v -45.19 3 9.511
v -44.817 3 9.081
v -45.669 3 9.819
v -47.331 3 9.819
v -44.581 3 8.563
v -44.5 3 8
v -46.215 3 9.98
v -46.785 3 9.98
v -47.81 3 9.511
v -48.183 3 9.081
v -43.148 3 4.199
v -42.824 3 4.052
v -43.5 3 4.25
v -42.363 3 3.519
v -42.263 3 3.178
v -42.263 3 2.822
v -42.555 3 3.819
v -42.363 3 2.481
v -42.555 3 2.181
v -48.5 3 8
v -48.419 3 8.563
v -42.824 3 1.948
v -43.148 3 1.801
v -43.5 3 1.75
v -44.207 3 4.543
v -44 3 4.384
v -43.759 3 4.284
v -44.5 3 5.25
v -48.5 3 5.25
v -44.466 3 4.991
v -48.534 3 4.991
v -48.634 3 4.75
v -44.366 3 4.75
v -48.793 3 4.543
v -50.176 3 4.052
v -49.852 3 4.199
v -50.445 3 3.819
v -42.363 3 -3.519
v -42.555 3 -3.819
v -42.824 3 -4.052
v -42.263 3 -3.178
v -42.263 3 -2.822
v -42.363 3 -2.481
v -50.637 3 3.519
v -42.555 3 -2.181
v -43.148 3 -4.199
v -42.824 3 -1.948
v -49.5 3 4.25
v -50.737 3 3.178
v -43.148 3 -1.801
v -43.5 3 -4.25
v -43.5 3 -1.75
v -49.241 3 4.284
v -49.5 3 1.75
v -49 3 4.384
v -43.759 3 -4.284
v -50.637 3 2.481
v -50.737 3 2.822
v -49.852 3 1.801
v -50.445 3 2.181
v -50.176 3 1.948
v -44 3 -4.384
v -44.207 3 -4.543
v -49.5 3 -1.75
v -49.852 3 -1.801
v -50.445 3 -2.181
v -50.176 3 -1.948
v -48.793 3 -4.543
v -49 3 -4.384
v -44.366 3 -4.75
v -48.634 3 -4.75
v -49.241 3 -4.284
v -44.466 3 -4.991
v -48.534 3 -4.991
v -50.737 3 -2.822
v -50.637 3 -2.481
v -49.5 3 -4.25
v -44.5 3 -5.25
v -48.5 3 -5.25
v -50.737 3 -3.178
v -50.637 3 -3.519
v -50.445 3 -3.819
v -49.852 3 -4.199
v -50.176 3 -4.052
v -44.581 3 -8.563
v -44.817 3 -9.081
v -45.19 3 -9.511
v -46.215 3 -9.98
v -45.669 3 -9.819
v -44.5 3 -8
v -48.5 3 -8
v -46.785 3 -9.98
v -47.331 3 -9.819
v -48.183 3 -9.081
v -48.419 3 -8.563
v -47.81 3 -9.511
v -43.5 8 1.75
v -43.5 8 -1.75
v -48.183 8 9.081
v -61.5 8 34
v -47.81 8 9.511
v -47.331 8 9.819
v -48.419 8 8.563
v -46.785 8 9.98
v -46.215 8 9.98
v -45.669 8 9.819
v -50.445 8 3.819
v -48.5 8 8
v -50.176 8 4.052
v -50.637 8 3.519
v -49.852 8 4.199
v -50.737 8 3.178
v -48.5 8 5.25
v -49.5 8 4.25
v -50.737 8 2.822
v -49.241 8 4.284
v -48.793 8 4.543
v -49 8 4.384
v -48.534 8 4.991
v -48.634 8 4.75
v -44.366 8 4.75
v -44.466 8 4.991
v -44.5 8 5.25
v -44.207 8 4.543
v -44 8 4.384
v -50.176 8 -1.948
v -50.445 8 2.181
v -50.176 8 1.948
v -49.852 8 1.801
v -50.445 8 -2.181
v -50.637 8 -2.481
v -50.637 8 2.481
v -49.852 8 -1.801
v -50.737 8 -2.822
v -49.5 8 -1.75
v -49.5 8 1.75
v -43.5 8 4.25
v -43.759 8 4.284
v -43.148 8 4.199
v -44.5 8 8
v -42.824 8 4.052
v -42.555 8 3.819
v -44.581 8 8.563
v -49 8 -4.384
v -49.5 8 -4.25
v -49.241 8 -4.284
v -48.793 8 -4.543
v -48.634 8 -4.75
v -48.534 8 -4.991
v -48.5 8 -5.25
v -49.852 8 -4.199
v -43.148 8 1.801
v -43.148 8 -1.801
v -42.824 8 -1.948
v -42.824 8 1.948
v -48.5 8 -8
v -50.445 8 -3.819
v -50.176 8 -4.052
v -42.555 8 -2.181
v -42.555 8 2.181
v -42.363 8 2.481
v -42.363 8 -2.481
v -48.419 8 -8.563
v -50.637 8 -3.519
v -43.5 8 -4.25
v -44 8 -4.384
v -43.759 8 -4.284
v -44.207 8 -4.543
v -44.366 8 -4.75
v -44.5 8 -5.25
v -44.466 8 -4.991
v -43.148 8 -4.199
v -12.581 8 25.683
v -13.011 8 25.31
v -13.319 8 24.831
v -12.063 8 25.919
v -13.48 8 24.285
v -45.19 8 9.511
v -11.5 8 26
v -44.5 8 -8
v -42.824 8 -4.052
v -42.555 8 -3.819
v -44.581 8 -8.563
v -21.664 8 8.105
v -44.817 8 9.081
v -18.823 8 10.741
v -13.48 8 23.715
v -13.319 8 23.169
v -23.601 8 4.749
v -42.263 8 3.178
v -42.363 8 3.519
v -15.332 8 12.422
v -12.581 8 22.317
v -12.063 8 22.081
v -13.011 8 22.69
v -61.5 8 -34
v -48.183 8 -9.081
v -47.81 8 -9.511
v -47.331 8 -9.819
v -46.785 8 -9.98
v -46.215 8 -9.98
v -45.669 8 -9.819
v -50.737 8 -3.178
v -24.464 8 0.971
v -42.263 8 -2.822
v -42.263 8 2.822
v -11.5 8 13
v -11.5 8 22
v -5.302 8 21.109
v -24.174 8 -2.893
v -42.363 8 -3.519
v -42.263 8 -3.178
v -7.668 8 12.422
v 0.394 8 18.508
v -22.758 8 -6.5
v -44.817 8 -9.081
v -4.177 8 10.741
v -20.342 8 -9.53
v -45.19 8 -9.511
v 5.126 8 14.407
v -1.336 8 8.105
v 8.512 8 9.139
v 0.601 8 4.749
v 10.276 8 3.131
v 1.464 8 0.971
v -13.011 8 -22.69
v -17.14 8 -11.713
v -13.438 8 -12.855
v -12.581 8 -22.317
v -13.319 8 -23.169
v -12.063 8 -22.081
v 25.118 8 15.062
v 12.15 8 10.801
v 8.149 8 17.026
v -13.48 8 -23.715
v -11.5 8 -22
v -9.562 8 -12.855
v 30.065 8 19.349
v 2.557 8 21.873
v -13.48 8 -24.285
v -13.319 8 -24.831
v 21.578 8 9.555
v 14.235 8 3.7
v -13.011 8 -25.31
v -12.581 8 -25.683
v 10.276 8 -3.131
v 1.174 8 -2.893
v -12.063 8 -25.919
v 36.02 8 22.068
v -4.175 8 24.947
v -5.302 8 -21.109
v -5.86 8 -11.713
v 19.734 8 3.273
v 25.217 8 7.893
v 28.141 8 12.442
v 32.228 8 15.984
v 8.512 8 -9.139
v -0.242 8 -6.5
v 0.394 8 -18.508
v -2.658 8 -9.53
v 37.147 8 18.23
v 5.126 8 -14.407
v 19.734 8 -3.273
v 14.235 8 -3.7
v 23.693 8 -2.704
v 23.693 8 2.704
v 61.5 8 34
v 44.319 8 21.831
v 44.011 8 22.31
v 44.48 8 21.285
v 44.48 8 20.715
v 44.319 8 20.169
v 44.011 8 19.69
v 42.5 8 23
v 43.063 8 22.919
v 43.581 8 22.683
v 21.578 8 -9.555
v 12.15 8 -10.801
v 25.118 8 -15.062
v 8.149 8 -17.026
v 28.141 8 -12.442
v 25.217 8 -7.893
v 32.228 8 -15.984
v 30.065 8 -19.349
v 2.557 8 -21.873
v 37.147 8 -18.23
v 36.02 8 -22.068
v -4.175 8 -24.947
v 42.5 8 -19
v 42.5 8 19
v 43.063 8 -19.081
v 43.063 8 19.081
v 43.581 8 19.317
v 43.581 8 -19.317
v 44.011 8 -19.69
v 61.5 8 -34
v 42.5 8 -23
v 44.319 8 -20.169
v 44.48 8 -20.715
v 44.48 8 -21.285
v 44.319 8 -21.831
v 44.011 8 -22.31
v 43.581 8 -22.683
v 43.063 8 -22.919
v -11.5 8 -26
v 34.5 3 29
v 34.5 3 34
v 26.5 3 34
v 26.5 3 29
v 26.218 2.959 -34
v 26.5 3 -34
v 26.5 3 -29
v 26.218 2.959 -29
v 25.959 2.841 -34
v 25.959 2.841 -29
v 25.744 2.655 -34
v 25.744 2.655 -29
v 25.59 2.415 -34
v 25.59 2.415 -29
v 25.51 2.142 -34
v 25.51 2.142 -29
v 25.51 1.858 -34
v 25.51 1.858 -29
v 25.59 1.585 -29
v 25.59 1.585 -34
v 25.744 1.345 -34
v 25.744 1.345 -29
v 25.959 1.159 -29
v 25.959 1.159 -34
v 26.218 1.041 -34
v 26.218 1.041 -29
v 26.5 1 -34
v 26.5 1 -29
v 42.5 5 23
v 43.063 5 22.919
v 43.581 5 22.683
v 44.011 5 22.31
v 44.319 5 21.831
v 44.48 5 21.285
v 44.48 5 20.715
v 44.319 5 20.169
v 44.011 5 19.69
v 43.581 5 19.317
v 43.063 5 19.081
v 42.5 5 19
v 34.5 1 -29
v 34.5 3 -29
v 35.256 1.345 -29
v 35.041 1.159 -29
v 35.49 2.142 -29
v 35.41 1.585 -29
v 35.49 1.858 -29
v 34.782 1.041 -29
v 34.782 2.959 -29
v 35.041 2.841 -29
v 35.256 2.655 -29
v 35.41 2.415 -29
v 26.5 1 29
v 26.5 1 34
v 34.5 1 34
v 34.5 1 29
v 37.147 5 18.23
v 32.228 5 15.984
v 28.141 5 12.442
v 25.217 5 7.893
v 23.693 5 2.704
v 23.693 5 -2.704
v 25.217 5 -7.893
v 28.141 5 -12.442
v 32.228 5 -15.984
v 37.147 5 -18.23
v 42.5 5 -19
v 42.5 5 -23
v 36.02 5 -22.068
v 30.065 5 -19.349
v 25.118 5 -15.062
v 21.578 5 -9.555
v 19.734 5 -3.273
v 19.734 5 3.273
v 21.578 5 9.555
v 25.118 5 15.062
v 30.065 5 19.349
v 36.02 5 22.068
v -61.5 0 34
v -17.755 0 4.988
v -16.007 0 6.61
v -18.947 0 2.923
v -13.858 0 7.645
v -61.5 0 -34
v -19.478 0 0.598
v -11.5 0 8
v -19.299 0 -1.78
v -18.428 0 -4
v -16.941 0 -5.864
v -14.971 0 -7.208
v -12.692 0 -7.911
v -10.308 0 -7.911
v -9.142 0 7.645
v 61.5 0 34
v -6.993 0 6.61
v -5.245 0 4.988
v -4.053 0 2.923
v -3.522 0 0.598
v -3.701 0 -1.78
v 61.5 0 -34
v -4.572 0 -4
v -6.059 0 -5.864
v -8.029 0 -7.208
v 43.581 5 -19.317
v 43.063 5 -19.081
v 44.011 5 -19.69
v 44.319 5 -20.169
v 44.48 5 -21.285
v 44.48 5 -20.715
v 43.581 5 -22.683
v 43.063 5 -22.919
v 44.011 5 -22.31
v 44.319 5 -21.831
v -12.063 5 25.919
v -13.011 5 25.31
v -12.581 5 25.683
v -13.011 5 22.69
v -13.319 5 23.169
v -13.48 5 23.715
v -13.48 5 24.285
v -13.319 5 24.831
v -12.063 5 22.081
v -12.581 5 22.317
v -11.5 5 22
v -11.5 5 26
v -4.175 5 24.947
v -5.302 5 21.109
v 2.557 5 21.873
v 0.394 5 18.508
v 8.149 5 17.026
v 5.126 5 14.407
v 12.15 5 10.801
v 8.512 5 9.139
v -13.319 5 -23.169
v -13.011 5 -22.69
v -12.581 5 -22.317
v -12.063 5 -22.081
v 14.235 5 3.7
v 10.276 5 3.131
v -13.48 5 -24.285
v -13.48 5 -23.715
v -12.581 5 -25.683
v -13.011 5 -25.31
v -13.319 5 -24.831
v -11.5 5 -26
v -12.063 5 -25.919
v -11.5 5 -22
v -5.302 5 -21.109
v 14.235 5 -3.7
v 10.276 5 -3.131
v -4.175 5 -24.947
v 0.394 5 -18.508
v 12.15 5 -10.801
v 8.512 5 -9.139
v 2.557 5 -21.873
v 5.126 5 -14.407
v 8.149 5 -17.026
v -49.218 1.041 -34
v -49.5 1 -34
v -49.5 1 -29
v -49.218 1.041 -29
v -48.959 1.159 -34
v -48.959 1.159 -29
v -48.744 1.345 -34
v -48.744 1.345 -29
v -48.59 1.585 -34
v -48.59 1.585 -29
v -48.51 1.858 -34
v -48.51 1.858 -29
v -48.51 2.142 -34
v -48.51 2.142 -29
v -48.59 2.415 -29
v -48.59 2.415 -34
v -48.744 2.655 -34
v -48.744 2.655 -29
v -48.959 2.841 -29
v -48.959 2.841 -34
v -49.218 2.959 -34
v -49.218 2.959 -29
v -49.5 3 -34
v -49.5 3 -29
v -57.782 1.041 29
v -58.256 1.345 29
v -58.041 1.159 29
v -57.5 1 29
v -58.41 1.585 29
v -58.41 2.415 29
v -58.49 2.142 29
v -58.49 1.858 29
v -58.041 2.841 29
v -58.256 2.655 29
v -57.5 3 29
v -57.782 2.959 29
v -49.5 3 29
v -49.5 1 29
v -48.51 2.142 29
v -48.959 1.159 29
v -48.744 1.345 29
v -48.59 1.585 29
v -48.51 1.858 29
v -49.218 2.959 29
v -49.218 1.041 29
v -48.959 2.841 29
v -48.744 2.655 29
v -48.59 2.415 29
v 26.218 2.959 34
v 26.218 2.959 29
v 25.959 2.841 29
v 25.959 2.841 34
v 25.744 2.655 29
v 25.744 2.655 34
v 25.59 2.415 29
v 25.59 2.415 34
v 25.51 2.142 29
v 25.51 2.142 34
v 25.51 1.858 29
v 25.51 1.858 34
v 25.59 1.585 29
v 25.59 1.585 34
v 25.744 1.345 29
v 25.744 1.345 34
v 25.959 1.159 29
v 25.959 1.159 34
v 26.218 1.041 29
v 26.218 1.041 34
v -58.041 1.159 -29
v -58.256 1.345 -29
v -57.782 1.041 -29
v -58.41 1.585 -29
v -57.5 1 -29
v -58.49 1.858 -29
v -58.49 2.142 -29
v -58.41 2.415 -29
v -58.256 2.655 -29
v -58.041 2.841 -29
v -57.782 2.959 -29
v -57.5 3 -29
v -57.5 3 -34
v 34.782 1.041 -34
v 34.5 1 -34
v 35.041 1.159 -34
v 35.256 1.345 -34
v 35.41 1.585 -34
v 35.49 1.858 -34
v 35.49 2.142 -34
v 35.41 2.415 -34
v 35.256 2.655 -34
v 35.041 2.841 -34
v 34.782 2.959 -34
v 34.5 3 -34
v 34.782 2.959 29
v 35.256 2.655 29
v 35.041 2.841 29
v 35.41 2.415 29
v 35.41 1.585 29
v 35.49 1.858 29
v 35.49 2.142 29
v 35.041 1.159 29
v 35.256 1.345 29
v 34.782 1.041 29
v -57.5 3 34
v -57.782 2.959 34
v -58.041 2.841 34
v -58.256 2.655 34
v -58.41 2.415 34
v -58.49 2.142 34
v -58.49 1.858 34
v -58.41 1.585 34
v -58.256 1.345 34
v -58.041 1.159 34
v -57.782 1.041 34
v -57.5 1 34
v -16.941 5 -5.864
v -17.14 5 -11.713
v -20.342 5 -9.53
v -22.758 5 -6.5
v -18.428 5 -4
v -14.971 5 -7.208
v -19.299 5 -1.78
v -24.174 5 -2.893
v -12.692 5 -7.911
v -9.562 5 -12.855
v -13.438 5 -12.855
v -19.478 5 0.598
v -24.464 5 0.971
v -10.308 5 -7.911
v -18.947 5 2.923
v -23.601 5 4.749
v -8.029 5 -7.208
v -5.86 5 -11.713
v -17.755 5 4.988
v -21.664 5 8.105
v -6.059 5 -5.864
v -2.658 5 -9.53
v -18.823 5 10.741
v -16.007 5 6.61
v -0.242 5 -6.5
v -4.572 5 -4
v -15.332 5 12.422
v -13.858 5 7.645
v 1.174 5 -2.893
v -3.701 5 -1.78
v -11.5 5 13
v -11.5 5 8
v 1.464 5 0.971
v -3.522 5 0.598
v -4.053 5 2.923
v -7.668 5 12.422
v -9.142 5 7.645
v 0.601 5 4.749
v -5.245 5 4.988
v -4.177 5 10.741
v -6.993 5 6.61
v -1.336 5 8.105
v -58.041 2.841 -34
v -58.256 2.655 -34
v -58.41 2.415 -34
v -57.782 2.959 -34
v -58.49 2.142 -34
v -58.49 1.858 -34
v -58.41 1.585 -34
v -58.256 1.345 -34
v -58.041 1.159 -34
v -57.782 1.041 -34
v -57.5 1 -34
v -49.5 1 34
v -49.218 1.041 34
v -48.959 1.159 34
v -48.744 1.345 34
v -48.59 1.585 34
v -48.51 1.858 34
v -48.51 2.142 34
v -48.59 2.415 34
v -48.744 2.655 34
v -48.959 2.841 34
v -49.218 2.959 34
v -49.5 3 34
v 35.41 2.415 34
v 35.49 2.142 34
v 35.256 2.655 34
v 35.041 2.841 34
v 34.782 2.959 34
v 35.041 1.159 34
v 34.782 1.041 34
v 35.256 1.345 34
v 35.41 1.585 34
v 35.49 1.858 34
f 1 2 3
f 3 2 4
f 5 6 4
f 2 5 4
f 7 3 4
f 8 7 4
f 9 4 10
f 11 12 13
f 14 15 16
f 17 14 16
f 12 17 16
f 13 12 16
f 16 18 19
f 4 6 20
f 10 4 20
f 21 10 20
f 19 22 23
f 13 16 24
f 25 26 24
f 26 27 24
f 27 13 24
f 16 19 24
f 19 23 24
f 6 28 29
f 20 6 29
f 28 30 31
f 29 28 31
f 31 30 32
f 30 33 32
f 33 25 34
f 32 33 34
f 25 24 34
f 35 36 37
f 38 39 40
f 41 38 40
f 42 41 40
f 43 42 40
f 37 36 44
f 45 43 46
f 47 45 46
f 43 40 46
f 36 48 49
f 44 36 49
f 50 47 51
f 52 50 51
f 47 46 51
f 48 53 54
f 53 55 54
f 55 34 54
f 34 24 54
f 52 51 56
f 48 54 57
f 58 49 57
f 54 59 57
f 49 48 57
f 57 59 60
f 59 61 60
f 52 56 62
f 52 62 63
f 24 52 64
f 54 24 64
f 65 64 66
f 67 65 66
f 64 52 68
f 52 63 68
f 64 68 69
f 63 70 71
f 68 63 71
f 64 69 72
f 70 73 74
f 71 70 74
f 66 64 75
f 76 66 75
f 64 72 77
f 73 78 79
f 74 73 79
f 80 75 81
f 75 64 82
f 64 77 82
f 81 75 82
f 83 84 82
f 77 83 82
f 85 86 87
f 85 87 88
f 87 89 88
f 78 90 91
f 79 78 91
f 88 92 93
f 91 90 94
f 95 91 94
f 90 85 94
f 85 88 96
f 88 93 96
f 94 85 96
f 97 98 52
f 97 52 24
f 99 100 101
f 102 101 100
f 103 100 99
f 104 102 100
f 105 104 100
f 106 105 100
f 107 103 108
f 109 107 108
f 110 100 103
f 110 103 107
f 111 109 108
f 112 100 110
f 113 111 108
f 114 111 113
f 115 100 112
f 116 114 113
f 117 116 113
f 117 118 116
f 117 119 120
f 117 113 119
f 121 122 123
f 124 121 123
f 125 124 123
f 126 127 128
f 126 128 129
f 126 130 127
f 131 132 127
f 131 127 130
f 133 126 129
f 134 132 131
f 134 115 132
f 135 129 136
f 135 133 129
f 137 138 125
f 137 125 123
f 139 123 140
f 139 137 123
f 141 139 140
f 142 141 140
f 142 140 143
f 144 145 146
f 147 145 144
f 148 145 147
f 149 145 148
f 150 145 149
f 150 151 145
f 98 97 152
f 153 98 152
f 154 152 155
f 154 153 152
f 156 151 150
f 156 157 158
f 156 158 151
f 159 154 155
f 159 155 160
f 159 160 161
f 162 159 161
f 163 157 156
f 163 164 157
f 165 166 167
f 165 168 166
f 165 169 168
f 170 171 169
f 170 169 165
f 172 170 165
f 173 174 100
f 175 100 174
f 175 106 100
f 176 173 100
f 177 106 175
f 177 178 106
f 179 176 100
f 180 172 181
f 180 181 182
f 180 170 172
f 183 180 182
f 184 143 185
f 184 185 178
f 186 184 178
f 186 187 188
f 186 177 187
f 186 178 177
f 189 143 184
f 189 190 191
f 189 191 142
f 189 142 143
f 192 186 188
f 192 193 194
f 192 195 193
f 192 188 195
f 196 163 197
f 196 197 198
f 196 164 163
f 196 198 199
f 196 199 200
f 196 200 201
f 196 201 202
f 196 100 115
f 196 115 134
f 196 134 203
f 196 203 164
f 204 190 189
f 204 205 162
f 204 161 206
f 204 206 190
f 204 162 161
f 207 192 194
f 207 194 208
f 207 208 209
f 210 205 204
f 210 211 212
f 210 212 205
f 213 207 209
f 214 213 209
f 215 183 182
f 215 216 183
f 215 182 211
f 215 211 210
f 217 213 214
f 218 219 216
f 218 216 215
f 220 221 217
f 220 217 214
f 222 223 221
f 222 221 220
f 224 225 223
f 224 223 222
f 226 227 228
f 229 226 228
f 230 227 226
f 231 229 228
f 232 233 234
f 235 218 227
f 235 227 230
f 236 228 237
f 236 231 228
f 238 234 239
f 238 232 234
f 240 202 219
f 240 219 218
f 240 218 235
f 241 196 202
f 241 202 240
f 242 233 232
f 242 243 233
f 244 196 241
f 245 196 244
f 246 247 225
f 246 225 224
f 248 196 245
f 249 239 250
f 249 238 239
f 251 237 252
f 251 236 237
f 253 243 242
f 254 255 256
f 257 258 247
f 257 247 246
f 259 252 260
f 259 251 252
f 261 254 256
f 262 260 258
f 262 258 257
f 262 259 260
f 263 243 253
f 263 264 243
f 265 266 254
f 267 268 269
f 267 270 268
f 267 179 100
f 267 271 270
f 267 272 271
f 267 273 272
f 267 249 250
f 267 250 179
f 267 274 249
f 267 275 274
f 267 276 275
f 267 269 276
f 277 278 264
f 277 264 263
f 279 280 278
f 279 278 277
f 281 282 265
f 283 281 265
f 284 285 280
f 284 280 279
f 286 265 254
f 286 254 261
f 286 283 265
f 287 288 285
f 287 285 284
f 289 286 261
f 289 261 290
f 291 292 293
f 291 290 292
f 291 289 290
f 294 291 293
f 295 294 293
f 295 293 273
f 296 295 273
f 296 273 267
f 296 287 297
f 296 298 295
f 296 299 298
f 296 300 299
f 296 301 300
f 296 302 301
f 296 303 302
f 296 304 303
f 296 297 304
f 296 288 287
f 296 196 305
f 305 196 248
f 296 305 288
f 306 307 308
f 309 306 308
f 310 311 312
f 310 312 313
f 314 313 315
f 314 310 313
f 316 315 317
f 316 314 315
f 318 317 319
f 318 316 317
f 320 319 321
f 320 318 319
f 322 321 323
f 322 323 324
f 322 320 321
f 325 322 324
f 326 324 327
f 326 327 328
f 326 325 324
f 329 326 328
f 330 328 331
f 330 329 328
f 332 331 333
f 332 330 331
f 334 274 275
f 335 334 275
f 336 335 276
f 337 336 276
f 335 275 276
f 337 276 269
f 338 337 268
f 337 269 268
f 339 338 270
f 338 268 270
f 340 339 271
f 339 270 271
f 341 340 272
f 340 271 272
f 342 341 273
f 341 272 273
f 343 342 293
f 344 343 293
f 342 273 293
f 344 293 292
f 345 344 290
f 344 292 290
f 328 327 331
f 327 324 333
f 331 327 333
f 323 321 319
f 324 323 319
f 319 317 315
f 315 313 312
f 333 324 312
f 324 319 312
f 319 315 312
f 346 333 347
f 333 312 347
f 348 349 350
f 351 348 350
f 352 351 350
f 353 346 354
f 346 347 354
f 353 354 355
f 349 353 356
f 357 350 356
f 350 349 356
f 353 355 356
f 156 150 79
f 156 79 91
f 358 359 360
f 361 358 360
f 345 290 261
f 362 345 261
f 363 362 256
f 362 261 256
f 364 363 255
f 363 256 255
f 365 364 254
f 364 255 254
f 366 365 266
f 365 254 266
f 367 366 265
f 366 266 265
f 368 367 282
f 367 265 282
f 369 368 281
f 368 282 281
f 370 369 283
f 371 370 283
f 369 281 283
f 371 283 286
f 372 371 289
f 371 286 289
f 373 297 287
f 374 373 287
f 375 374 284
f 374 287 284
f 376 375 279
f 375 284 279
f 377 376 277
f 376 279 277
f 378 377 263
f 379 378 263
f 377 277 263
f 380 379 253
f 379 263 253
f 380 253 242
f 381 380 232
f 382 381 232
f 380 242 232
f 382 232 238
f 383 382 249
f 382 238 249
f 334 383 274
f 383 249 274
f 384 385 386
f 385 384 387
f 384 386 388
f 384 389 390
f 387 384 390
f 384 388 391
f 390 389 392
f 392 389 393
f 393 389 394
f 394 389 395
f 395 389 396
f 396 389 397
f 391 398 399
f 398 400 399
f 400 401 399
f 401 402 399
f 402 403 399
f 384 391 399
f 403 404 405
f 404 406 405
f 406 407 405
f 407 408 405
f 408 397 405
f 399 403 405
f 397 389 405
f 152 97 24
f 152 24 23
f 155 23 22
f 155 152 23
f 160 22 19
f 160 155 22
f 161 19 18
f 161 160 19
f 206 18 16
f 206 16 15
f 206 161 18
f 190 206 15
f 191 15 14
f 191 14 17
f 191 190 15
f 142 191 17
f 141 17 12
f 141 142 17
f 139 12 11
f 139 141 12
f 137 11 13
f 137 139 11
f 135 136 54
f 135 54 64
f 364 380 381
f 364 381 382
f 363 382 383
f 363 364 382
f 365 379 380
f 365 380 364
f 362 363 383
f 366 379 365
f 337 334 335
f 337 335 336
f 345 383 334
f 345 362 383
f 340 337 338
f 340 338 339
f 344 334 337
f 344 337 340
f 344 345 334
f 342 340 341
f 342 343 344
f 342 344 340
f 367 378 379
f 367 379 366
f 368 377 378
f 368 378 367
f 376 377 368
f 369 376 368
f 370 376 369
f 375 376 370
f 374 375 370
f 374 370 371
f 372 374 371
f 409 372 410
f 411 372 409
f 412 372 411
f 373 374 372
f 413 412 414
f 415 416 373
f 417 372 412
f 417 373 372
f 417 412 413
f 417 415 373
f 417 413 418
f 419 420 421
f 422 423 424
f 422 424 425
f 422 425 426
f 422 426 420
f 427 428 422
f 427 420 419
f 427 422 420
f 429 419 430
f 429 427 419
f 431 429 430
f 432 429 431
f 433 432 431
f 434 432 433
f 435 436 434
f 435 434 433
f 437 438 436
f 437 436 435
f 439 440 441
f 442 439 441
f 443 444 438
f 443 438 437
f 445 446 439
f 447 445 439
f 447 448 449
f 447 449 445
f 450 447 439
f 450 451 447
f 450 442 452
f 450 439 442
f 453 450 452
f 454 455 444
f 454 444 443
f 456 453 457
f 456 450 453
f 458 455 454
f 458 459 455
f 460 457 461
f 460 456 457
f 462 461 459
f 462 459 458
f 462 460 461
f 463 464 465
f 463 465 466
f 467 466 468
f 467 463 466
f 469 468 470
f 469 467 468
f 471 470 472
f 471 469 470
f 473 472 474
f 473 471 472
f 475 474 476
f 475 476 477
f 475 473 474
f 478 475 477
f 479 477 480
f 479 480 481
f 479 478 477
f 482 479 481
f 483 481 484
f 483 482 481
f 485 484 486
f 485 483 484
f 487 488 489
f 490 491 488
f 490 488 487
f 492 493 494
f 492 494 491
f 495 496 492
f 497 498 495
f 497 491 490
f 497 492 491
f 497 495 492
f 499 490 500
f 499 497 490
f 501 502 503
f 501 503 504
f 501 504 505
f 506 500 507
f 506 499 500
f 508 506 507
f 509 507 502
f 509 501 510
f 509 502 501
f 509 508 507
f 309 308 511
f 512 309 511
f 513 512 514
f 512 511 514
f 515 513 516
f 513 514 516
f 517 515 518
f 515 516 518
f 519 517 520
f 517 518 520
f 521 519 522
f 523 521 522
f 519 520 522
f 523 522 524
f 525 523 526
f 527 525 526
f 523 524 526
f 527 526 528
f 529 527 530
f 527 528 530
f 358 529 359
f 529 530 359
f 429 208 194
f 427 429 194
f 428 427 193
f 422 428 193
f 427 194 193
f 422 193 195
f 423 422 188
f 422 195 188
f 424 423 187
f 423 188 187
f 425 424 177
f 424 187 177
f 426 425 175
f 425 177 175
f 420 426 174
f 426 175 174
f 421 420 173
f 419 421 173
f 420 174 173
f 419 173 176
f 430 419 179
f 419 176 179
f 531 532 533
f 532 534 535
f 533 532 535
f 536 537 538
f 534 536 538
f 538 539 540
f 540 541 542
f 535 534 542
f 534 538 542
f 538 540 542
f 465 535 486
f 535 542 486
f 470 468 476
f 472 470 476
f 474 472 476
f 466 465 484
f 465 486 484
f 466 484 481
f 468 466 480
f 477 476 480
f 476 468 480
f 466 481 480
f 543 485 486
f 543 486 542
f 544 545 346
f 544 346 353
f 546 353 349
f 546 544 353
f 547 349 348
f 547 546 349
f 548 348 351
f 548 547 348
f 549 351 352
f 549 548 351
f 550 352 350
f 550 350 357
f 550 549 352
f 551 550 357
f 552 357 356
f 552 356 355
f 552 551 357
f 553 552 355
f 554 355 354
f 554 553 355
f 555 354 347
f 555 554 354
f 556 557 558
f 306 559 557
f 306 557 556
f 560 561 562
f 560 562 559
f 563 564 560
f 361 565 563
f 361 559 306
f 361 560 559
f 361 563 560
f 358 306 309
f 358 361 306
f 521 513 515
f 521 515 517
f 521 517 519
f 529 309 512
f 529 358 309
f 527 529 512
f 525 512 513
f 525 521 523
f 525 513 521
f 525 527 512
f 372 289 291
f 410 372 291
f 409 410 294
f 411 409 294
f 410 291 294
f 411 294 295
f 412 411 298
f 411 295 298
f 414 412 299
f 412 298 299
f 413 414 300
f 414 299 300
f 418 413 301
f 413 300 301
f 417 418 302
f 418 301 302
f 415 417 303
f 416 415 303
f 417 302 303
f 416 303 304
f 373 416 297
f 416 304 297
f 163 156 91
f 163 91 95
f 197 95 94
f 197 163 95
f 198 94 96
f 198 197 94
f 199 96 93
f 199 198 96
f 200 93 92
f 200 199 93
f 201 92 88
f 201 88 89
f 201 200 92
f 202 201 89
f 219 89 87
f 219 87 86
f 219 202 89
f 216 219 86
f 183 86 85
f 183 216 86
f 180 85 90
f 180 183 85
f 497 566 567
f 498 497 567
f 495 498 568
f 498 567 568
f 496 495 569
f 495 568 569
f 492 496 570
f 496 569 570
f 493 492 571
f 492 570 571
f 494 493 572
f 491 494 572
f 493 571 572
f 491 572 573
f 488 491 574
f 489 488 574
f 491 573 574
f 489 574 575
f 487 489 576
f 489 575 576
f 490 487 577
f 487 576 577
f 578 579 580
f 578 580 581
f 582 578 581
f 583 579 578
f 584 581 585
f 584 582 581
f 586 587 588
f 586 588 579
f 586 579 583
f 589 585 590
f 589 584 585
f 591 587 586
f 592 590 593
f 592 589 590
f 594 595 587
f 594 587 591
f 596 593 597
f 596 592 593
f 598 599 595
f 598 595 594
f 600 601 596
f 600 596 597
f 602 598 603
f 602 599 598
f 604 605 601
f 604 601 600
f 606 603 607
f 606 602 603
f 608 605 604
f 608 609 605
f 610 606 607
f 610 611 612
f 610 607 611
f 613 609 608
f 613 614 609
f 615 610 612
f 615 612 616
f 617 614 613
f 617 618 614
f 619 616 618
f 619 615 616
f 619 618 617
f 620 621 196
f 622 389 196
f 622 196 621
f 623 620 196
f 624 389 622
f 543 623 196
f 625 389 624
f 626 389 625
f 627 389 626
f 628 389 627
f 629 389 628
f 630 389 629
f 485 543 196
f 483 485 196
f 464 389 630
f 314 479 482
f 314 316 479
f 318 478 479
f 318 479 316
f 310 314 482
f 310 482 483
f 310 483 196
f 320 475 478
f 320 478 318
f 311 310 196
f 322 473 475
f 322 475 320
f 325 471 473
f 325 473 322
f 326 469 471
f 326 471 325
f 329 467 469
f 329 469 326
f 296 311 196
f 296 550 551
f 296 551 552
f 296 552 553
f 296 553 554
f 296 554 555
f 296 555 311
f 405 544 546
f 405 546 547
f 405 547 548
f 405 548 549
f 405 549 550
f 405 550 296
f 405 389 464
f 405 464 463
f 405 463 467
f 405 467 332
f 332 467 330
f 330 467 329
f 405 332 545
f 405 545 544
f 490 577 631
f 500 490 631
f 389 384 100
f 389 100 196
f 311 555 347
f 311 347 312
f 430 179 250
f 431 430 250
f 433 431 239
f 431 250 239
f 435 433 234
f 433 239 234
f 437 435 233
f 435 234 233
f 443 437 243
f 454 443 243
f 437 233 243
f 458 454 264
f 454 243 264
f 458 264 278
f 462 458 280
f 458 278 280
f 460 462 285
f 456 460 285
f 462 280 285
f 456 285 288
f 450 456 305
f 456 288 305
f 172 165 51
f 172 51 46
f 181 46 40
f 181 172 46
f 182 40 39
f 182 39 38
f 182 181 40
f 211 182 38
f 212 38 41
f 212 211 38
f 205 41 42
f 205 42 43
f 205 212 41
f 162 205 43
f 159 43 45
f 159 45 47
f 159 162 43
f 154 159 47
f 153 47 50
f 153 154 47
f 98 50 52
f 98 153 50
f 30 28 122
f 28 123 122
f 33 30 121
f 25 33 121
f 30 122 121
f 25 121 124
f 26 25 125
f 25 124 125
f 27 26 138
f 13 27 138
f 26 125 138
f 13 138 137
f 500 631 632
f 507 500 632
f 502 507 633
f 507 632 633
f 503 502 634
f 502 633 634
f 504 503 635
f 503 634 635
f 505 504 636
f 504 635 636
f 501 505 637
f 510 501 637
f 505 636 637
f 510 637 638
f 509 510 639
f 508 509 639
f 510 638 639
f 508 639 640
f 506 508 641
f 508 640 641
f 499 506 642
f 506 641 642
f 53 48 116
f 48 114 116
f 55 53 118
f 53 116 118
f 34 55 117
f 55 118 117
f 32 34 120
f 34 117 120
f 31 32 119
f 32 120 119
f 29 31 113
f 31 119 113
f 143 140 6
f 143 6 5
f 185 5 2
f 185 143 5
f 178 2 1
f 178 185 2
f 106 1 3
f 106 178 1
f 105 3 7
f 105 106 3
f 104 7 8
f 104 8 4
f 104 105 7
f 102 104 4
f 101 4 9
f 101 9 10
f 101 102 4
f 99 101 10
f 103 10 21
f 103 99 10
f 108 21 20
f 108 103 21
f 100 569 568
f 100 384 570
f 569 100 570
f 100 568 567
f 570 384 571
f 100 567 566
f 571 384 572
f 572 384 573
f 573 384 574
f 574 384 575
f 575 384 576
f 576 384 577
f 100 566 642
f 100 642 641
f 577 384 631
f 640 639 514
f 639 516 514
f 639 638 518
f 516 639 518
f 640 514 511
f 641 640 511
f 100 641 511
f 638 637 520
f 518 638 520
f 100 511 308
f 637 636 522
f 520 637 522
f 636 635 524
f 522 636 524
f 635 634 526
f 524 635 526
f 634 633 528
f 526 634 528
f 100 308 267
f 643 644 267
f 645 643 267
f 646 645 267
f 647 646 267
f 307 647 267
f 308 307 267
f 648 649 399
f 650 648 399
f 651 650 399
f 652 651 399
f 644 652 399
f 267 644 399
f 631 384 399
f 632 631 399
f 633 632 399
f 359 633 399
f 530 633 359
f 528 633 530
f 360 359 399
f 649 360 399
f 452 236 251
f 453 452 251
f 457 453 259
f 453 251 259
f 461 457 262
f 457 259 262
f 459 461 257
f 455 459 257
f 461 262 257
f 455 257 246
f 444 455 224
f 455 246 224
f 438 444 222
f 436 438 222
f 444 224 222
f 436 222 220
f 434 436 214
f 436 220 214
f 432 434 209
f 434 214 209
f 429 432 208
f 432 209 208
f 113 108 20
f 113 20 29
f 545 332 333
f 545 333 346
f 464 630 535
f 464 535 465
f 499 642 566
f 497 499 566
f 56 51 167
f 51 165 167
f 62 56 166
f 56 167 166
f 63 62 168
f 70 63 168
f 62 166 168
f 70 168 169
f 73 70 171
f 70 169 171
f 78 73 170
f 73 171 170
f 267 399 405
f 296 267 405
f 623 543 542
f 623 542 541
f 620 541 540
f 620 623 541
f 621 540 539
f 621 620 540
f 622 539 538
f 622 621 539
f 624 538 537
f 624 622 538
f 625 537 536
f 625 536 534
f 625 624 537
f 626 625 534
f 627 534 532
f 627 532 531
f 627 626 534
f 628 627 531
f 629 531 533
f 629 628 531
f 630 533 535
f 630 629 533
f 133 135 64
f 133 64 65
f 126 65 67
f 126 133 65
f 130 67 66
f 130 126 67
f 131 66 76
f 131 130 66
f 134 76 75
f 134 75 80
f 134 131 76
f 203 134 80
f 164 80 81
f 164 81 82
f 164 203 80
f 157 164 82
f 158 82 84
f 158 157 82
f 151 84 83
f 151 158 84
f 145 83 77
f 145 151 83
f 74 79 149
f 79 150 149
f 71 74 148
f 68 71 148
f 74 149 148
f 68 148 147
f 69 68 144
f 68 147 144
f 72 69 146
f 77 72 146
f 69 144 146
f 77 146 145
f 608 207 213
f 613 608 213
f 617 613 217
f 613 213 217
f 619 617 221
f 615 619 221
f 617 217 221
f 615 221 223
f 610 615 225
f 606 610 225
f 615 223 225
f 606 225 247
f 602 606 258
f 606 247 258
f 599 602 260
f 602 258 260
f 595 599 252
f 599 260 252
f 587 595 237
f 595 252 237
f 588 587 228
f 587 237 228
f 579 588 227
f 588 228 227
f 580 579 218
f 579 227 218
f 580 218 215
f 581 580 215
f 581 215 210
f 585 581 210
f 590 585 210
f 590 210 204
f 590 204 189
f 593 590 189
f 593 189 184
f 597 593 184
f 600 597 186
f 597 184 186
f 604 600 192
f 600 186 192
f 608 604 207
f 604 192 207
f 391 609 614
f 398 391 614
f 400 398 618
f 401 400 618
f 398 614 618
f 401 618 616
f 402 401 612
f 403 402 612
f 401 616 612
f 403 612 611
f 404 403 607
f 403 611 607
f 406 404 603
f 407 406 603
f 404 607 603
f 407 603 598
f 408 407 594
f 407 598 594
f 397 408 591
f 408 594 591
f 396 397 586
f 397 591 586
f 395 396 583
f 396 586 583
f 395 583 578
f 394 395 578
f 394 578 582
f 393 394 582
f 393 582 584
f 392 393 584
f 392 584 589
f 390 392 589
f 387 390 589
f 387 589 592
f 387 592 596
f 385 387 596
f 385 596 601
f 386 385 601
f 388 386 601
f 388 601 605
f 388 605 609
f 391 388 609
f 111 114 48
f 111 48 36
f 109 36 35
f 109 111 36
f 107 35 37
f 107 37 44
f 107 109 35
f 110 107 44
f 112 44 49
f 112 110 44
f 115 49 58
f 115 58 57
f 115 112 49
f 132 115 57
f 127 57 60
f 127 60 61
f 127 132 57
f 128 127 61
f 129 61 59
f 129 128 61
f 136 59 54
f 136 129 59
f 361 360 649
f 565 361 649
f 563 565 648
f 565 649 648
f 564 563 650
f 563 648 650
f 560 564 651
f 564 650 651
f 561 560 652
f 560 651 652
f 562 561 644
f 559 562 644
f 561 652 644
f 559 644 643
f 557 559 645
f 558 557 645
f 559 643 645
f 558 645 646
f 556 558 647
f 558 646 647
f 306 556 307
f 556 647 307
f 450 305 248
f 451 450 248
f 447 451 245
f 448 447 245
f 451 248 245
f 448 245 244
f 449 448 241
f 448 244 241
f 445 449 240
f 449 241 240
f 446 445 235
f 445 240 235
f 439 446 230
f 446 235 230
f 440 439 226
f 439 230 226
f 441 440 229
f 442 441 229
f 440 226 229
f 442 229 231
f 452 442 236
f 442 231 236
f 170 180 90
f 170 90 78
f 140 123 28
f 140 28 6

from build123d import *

# Parameters (mm, degrees)
SKETCH1_W              = 123
SKETCH1_H              = 68
BOSS_EXTRUDE1_DEPTH    = 8
CUT_EXTRUDE1_DEPTH     = 5
LPATTERN6_COUNT        = 2
LPATTERN6_PITCH        = 84
LPATTERN6_COPY_1_DEPTH = 5
SKETCH7_R              = 8
CUT_EXTRUDE2_DEPTH     = 10
SKETCH8_R              = 13
CUT_EXTRUDE3_DEPTH     = 3
CUT_EXTRUDE4_DEPTH     = 5
CUT_EXTRUDE5_DEPTH     = 3
CUT_EXTRUDE6_DEPTH     = 3
CUT_EXTRUDE7_DEPTH     = 5
FILLET2_R              = 1


with BuildPart() as part:
    # Sketch1 → Boss-Extrude1 (new body)
    with BuildSketch(Plane(origin=(0, 0, 0), x_dir=(1, 0, 0), z_dir=(0, 1, 0))):
        Rectangle(SKETCH1_W, SKETCH1_H)
    extrude(amount=BOSS_EXTRUDE1_DEPTH)

    # Sketch6 → Cut-Extrude1 (cut)
    with BuildSketch(Plane(origin=(0, 0, -34), x_dir=(-1, 0, 0), z_dir=(0, 0, -1))):
        with BuildLine():
            Line((49.5, 3), (57.5, 3))
            ThreePointArc((57.5, 3), (58.5, 2), (57.5, 1))
            Line((57.5, 1), (49.5, 1))
            ThreePointArc((49.5, 1), (48.5, 2), (49.5, 3))
        make_face()
    cut_extrude1 = extrude(amount=-CUT_EXTRUDE1_DEPTH, mode=Mode.SUBTRACT)

    # Mirror16: Cut-Extrude1 across plane
    add(cut_extrude1.mirror(Plane.XY), mode=Mode.SUBTRACT)

    # LPattern6: Cut-Extrude1 ×2
    with Locations(*[(i * LPATTERN6_PITCH, 0, 0) for i in range(1, LPATTERN6_COUNT)]):
        add(cut_extrude1, mode=Mode.SUBTRACT)

    # LPattern6 copy 1 sketch → LPattern6 copy 1 (cut)
    with BuildSketch(Plane(origin=(84, 0, 34), x_dir=(-1, 0, 0), z_dir=(0, 0, 1))):
        with BuildLine():
            Line((49.5, -3), (57.5, -3))
            ThreePointArc((57.5, -3), (58.5, -2), (57.5, -1))
            Line((57.5, -1), (49.5, -1))
            ThreePointArc((49.5, -1), (48.5, -2), (49.5, -3))
        make_face()
    extrude(amount=-LPATTERN6_COPY_1_DEPTH, mode=Mode.SUBTRACT)

    # Sketch7 → Cut-Extrude2 (cut)
    with BuildSketch(Plane(origin=(0, 8, 0), x_dir=(1, 0, 0), z_dir=(0, 1, 0))):
        with Locations(Location((-11.5, 0, 0), (0, 0, 270))):
            Circle(SKETCH7_R)
    extrude(amount=-CUT_EXTRUDE2_DEPTH, mode=Mode.SUBTRACT)

    # Sketch8 → Cut-Extrude3 (cut)
    with BuildSketch(Plane(origin=(0, 8, 0), x_dir=(1, 0, 0), z_dir=(0, 1, 0))):
        with Locations(Location((-11.5, 0, 0), (0, 0, 270))):
            Circle(SKETCH8_R)
    extrude(amount=-CUT_EXTRUDE3_DEPTH, mode=Mode.SUBTRACT)

    # Sketch9 → Cut-Extrude4 (cut)
    with BuildSketch(Plane(origin=(0, 8, 0), x_dir=(1, 0, 0), z_dir=(0, 1, 0))):
        with BuildLine():
            Line((-44.5, 8), (-44.5, -8))
            ThreePointArc((-44.5, -8), (-46.5, -10), (-48.5, -8))
            Line((-48.5, -8), (-48.5, 8))
            ThreePointArc((-48.5, 8), (-46.5, 10), (-44.5, 8))
        make_face()
    extrude(amount=-CUT_EXTRUDE4_DEPTH, mode=Mode.SUBTRACT)

    # Sketch10 → Cut-Extrude5 (cut)
    with BuildSketch(Plane(origin=(0, 8, 0), x_dir=(1, 0, 0), z_dir=(0, 1, 0))):
        with BuildLine():
            ThreePointArc((42.5, 23), (19.5, 0), (42.5, -23))
            ThreePointArc((42.5, -23), (44.5, -21), (42.5, -19))
            ThreePointArc((42.5, -19), (23.5, 0), (42.5, 19))
            ThreePointArc((42.5, 19), (44.5, 21), (42.5, 23))
        make_face()
    extrude(amount=-CUT_EXTRUDE5_DEPTH, mode=Mode.SUBTRACT)

    # Sketch11 → Cut-Extrude6 (cut)
    with BuildSketch(Plane(origin=(0, 8, 0), x_dir=(1, 0, 0), z_dir=(0, 1, 0))):
        with BuildLine():
            ThreePointArc((-11.5, -26), (14.5, 0), (-11.5, 26))
            ThreePointArc((-11.5, 26), (-13.5, 24), (-11.5, 22))
            ThreePointArc((-11.5, 22), (10.5, 0), (-11.5, -22))
            ThreePointArc((-11.5, -22), (-13.5, -24), (-11.5, -26))
        make_face()
    extrude(amount=-CUT_EXTRUDE6_DEPTH, mode=Mode.SUBTRACT)

    # Sketch12 → Cut-Extrude7 (cut)
    with BuildSketch(Plane(origin=(0, 8, 0), x_dir=(1, 0, 0), z_dir=(0, 1, 0))):
        with BuildLine():
            Line((-48.25, 3), (-44.75, 3))
            ThreePointArc((-44.75, 3), (-42.616116524, 3.883883476), (-43.5, 1.75))
            Line((-43.5, 1.75), (-43.5, -1.75))
            ThreePointArc((-43.5, -1.75), (-42.616116524, -3.883883476), (-44.75, -3))
            Line((-44.75, -3), (-48.25, -3))
            ThreePointArc((-48.25, -3), (-50.383883476, -3.883883476), (-49.5, -1.75))
            Line((-49.5, -1.75), (-49.5, 1.75))
            ThreePointArc((-49.5, 1.75), (-50.383883476, 3.883883476), (-48.25, 3))
        make_face()
    extrude(amount=-CUT_EXTRUDE7_DEPTH, mode=Mode.SUBTRACT)

    # Fillet2
    fillet2_edges = [part.edges().sort_by_distance(p)[0] for p in [
        (-48.5, 5.5, -3.75),
        (-44.5, 5.5, -3.75),
        (-44.5, 5.5, 3.75),
        (-48.5, 5.5, 3.75),
    ]]
    fillet(fillet2_edges, radius=FILLET2_R)


solid = part.part
